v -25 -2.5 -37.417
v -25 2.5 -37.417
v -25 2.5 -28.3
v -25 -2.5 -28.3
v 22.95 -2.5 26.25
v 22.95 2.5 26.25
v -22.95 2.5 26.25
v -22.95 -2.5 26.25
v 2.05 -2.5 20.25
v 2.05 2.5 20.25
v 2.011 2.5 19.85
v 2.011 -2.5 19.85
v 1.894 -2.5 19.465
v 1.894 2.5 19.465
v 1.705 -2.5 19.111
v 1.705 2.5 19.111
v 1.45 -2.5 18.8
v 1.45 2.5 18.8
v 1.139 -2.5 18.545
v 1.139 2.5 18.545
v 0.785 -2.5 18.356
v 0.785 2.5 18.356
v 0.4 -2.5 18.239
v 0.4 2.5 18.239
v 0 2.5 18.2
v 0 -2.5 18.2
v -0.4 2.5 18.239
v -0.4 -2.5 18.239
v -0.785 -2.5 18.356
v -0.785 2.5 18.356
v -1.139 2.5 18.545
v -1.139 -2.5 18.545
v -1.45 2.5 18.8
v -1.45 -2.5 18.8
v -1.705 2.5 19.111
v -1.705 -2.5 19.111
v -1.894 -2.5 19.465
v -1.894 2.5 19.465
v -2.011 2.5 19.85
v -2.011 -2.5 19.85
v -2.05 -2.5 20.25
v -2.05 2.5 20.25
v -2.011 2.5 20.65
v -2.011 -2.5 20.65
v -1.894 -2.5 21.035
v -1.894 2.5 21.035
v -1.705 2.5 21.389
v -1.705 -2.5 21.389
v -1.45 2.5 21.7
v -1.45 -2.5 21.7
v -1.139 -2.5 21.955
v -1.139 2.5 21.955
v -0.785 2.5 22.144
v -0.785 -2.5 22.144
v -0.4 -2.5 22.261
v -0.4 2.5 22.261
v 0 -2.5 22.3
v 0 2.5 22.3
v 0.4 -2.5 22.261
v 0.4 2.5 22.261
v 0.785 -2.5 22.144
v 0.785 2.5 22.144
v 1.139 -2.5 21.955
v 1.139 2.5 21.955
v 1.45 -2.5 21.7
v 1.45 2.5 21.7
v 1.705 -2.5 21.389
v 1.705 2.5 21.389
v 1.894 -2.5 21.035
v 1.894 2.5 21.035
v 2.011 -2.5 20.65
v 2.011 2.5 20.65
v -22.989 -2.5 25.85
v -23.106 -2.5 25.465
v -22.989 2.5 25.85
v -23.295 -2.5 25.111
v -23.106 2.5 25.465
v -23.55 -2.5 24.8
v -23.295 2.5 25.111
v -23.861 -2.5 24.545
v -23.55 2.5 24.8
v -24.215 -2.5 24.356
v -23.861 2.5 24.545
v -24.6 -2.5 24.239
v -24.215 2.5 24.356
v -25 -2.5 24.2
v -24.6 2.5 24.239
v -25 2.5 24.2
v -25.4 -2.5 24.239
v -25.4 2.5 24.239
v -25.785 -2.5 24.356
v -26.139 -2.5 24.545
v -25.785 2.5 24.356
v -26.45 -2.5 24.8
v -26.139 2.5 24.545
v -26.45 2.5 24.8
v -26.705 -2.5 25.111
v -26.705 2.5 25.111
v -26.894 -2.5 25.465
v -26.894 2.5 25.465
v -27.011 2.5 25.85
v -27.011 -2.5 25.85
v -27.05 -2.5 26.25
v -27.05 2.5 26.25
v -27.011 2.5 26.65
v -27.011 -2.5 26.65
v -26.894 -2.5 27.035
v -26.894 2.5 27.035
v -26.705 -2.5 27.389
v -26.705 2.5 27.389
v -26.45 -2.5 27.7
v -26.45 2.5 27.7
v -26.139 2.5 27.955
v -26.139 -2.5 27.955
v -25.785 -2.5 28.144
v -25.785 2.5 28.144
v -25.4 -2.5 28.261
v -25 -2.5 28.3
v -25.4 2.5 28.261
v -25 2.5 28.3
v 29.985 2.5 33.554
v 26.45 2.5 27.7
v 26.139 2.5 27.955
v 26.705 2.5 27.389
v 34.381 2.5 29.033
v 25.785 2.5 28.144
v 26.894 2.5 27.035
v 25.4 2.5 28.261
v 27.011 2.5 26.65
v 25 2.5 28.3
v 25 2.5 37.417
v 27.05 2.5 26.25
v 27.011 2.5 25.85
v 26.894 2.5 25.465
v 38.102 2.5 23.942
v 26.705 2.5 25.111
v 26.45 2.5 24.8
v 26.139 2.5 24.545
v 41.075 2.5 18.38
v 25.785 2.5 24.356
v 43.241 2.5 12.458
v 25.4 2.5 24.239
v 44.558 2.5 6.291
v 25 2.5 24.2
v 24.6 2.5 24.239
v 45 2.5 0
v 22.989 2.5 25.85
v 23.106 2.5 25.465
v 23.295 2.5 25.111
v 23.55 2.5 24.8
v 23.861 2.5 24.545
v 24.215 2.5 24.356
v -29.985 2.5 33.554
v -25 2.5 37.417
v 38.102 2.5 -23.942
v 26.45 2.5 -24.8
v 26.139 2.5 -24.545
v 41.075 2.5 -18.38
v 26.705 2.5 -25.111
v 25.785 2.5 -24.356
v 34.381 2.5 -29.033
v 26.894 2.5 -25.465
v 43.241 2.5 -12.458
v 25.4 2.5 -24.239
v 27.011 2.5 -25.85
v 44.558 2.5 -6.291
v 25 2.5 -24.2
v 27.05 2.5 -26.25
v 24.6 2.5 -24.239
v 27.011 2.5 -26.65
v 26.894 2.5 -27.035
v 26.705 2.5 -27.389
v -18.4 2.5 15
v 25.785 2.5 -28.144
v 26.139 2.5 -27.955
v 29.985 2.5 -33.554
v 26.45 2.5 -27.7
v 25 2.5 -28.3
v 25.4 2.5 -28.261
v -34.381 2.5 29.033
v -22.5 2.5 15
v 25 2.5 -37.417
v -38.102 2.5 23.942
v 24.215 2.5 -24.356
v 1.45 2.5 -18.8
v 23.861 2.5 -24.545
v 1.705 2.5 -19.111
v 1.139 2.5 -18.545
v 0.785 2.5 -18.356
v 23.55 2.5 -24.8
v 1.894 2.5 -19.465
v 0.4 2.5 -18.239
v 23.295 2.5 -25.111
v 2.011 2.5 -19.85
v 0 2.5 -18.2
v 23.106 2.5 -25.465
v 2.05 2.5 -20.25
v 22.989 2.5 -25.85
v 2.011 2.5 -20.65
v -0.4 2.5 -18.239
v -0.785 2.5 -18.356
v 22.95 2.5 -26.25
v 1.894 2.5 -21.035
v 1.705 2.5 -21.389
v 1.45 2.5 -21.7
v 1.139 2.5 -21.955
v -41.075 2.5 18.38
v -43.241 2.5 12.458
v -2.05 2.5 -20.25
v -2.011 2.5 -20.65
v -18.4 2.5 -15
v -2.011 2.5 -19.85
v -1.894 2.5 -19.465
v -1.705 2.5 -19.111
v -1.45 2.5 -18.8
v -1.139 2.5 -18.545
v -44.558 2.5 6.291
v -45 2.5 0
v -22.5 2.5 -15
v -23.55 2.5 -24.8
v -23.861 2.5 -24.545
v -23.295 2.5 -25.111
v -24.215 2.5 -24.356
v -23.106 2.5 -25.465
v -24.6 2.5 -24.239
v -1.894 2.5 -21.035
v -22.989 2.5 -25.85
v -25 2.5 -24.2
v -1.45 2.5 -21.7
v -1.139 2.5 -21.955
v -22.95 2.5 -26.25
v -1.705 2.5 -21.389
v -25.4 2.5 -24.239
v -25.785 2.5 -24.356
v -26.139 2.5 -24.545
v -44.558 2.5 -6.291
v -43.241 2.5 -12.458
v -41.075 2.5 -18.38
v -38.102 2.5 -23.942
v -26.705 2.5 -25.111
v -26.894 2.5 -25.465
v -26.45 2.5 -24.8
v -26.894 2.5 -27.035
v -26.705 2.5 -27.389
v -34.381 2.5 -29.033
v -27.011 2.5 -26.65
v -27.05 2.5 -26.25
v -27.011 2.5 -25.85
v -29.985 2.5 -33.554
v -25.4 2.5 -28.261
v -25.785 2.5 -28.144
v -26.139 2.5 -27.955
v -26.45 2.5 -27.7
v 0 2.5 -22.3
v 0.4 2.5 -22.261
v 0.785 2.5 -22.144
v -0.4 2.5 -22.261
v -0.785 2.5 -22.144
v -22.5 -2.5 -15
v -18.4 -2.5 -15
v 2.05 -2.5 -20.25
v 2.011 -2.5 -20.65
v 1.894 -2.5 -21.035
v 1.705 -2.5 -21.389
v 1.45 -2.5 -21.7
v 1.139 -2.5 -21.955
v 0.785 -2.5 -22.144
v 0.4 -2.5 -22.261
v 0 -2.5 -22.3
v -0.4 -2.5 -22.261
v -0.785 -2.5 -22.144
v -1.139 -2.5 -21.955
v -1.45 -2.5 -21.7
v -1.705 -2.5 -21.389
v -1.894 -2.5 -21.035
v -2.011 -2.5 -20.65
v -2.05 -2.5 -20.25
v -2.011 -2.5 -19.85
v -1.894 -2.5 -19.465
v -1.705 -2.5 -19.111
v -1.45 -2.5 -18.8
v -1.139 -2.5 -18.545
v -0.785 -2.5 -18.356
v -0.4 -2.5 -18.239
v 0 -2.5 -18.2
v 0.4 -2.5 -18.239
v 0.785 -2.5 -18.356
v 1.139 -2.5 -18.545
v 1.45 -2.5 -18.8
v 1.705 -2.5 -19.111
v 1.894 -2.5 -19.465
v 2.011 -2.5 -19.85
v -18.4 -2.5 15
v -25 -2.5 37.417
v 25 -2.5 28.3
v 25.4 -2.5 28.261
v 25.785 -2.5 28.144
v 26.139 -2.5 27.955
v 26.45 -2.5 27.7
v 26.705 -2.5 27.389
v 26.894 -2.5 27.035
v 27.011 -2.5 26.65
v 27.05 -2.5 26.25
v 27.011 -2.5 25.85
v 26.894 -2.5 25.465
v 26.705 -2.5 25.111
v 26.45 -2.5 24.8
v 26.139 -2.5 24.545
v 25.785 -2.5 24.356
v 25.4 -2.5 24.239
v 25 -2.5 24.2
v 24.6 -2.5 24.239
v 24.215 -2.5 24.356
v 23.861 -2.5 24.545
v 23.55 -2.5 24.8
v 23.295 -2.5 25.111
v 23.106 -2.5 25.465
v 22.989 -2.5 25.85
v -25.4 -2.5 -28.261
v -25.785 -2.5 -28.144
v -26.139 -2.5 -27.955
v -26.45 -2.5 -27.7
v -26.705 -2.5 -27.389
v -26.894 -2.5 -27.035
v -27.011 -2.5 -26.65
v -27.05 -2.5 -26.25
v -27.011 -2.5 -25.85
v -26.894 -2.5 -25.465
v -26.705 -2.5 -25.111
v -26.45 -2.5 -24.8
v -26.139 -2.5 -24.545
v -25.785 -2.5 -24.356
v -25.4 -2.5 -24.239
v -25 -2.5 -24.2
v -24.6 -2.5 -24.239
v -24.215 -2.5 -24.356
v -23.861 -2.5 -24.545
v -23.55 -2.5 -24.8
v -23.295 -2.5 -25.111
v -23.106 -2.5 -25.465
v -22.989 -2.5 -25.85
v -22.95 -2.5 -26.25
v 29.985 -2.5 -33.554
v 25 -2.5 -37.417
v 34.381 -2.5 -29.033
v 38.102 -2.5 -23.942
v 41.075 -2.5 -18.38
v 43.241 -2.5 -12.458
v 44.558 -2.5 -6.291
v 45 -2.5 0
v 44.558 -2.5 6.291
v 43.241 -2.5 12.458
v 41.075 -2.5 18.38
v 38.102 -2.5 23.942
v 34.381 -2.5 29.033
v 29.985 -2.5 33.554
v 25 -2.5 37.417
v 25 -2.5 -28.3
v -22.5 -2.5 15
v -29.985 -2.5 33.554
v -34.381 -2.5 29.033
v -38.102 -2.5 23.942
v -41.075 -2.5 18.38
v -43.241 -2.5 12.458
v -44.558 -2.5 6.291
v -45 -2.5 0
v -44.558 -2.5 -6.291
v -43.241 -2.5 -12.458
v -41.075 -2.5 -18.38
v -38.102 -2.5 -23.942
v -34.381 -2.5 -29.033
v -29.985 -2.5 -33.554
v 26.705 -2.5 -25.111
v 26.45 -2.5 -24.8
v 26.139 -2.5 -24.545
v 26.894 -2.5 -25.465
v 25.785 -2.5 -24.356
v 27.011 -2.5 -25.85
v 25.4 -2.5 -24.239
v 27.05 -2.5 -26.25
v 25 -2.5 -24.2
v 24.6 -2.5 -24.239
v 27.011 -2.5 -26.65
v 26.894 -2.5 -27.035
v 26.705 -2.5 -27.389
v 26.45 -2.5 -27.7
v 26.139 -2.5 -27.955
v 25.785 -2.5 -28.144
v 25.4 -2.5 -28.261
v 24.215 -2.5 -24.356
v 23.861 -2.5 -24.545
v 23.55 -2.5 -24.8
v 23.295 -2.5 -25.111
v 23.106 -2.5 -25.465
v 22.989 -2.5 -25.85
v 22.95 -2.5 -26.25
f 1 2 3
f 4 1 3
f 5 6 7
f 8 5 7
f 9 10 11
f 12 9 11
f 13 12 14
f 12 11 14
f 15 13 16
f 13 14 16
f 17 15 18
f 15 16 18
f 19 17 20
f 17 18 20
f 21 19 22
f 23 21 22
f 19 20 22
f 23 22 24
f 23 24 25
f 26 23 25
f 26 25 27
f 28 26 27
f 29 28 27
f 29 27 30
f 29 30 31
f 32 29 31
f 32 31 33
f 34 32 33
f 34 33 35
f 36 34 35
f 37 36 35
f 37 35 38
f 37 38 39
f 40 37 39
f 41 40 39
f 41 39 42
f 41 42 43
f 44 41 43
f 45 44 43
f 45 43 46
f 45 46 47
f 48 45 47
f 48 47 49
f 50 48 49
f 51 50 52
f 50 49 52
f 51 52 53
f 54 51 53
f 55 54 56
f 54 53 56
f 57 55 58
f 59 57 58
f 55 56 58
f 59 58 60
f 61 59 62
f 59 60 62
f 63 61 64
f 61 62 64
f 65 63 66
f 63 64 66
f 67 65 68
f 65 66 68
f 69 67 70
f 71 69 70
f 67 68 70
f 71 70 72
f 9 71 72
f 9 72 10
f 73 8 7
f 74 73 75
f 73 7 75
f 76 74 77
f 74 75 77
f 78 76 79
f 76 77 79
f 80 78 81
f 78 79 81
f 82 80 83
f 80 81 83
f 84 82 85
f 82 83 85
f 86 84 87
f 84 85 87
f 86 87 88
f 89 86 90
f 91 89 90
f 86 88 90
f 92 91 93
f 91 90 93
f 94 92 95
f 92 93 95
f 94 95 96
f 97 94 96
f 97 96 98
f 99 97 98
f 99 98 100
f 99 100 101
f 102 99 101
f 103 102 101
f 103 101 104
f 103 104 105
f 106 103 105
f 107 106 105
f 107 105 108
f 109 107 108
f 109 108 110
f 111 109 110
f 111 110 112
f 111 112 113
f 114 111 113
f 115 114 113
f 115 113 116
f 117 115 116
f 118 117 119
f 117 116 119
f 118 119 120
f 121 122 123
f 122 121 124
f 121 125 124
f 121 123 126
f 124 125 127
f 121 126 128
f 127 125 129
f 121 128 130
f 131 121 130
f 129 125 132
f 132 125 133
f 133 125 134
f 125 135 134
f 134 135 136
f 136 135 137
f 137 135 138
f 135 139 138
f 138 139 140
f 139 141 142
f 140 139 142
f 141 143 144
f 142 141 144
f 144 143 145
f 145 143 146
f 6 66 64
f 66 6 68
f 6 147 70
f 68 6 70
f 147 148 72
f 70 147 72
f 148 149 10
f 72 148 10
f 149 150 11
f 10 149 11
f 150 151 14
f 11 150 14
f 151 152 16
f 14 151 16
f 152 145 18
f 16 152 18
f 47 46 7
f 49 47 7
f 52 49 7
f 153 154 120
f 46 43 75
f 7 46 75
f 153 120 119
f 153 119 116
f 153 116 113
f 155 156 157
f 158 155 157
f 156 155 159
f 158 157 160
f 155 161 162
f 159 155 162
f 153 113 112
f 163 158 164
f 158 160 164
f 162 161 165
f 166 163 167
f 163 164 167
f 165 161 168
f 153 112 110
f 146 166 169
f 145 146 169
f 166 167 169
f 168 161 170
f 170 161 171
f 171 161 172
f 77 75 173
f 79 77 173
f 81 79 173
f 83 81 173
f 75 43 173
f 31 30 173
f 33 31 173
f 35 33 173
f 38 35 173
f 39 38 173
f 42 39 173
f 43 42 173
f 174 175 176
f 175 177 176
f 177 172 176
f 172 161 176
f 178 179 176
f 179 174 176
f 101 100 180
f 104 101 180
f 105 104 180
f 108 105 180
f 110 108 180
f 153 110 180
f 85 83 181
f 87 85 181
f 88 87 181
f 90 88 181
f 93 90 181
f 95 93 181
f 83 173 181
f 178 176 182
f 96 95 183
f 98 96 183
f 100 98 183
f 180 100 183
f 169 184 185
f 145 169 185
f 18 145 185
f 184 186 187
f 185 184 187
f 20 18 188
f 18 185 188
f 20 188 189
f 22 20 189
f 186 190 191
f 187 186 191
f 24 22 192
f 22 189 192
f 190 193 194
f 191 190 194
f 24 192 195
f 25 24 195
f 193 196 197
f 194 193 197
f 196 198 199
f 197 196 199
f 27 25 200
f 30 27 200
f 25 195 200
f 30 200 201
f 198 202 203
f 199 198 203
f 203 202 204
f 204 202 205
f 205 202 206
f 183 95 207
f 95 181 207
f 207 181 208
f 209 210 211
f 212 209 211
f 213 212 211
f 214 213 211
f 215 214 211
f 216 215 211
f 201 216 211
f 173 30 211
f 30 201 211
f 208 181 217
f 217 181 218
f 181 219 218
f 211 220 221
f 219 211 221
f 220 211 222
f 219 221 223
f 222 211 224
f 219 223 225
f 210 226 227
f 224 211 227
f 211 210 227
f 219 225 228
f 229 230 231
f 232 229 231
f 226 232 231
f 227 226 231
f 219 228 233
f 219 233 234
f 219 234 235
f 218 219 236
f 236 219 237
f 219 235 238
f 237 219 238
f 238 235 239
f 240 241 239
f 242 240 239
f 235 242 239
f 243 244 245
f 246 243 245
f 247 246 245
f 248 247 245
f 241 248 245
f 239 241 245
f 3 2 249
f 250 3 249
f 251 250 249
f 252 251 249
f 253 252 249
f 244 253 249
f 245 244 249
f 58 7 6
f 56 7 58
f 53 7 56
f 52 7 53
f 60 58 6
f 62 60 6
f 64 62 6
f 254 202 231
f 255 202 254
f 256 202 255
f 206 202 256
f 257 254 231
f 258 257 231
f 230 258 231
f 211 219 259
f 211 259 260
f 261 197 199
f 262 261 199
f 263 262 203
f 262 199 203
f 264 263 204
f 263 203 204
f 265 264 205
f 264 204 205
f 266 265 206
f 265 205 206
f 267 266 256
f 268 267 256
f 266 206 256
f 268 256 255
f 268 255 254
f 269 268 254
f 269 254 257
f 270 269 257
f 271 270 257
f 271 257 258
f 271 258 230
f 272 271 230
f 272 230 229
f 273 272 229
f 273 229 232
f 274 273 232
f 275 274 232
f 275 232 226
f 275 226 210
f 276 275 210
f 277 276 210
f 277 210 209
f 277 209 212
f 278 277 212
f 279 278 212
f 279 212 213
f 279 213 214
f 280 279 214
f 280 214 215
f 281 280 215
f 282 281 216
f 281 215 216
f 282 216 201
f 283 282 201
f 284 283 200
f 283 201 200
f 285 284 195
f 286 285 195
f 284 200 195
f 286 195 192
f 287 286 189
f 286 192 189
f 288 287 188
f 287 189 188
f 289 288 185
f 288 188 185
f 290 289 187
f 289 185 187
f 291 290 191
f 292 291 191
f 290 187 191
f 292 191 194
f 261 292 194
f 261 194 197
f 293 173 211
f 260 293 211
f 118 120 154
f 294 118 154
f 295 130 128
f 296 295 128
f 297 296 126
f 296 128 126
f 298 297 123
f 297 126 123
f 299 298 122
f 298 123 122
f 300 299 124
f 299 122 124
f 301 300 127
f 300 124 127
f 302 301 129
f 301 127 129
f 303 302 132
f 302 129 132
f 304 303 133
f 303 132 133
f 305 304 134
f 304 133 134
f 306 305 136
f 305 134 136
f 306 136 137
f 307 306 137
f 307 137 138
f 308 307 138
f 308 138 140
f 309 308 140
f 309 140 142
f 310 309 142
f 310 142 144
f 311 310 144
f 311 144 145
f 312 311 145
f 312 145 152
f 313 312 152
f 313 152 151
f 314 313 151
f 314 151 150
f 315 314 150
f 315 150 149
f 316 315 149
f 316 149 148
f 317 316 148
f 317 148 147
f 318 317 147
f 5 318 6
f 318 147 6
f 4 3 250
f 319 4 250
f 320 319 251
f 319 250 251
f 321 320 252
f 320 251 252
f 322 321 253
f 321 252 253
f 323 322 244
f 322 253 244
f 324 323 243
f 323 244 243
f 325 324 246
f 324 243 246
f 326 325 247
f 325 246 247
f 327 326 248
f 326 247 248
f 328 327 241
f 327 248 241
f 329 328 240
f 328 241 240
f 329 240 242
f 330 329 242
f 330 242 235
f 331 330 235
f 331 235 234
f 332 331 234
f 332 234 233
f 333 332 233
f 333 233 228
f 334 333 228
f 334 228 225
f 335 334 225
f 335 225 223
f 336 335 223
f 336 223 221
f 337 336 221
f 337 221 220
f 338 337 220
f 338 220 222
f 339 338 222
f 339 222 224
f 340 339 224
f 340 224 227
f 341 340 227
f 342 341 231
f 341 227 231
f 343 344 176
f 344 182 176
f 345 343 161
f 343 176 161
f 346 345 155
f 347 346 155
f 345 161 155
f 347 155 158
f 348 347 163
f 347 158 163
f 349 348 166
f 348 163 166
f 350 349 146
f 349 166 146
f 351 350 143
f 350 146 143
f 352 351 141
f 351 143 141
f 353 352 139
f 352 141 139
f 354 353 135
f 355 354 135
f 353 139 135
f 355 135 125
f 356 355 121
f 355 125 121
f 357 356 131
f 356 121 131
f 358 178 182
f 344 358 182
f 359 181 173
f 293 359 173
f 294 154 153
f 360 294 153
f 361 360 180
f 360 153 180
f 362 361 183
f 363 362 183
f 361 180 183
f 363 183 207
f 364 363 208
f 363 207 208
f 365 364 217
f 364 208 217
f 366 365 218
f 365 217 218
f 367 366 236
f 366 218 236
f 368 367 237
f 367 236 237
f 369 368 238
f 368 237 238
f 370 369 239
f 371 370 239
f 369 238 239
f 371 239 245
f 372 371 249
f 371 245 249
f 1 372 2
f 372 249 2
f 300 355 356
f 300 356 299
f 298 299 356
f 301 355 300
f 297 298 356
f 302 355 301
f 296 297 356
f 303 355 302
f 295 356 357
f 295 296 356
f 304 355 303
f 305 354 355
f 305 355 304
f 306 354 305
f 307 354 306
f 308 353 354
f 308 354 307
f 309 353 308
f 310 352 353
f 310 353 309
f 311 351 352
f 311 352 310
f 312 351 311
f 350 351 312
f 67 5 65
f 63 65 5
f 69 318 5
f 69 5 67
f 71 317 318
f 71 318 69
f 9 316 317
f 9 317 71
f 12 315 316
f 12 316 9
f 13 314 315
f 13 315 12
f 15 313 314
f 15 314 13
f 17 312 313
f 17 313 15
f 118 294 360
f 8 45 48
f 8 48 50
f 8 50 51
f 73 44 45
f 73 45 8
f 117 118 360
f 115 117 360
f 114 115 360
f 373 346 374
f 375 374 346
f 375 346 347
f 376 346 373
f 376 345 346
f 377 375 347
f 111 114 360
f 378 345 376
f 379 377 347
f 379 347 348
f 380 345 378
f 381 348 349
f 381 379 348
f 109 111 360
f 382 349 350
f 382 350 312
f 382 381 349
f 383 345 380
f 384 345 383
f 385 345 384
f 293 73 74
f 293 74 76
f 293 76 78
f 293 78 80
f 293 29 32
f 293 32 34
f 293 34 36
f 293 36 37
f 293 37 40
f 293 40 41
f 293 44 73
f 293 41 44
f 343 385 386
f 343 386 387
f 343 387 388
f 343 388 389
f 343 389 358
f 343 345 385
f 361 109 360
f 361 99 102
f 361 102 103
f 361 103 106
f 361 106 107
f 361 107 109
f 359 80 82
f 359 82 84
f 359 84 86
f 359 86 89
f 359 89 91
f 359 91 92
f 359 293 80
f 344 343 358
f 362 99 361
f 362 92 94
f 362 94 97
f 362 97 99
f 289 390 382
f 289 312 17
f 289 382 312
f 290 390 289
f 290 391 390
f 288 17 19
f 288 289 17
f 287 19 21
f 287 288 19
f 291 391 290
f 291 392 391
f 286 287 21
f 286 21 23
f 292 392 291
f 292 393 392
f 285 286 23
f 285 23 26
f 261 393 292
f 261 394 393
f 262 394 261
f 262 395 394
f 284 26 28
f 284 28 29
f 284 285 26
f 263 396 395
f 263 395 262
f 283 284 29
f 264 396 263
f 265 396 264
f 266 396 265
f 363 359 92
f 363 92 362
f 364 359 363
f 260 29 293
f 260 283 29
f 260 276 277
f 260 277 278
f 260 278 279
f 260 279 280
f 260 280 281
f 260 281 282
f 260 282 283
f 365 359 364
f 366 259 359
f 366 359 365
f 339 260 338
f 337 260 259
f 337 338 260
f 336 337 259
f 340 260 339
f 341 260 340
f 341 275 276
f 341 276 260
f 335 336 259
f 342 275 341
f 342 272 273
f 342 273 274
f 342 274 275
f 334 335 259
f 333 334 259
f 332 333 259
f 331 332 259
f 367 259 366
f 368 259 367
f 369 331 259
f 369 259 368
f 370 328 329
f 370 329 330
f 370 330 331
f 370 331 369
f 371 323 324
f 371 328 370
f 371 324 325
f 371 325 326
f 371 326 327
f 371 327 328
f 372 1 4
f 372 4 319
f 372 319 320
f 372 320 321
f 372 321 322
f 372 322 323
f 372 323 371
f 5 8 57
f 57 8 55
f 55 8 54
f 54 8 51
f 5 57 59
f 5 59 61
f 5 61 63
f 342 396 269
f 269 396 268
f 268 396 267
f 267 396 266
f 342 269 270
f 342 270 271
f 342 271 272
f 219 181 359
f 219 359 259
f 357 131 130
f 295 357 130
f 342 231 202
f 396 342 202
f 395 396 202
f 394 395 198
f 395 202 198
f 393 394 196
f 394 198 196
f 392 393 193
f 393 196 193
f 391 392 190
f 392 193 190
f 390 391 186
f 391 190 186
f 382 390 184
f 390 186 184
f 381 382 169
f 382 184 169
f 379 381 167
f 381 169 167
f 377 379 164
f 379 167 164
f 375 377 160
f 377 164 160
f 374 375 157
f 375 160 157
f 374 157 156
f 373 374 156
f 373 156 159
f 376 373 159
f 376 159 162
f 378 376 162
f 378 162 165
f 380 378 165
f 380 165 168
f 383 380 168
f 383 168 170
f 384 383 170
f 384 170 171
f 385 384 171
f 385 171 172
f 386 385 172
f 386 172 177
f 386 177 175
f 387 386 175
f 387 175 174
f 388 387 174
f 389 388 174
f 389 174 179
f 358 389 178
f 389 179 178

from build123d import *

# Parameters (mm, degrees)
ESTRUSIONE_ESTRUSIONE1_DEPTH = 2.5
CROQUIS2_R                   = 2.05
CORTAR_EXTRUIR1_DEPTH        = 6
CUT_EXTRUDE1_REACH           = 7
SKETCH1_W                    = 4.1
SKETCH1_H                    = 30
CUT_EXTRUDE2_REACH           = 7
SKETCH2_R                    = 2.05


with BuildPart() as part:
    # Schizzo1 → Estrusione-Estrusione1 (new body, symmetric)
    with BuildSketch(Plane(origin=(0, 0, 0), x_dir=(1, 0, 0), z_dir=(0, 1, 0))):
        with BuildLine():
            Line((-25, 37.416573868), (-25, 26.25))
            Line((-25, 26.25), (25, 26.25))
            Line((25, 26.25), (25, 37.416573868))
            ThreePointArc((25, 37.416573868), (45, 0), (25, -37.416573868))
            Line((25, -37.416573868), (25, -26.25))
            Line((25, -26.25), (-25, -26.25))
            Line((-25, -26.25), (-25, -37.416573868))
            ThreePointArc((-25, -37.416573868), (-45, 0), (-25, 37.416573868))
        make_face()
    extrude(amount=ESTRUSIONE_ESTRUSIONE1_DEPTH, both=True)

    # Croquis2 → Cortar-Extruir1 (cut, through all)
    with BuildSketch(Plane(origin=(0, 2.5, 0), x_dir=(1, 0, 0), z_dir=(0, 1, 0))):
        with Locations((0, 20.25)):
            Circle(CROQUIS2_R)
        with Locations((0, -20.25)):
            Circle(CROQUIS2_R)
    extrude(amount=-CORTAR_EXTRUIR1_DEPTH, mode=Mode.SUBTRACT)

    # Sketch1 → Cut-Extrude1 (cut, up to next)
    with BuildSketch(Plane(origin=(0, 2.5, 0), x_dir=(1, 0, 0), z_dir=(0, 1, 0)), mode=Mode.PRIVATE) as cut_extrude1_sk1:
        with Locations((-20.45, 0)):
            Rectangle(SKETCH1_W, SKETCH1_H)
    cut_extrude1_tool1 = extrude(cut_extrude1_sk1.sketch, amount=-CUT_EXTRUDE1_REACH, mode=Mode.PRIVATE) & part.part
    add(cut_extrude1_tool1.solids().sort_by_distance((-20.45, 2.5, 0))[0], mode=Mode.SUBTRACT)

    # Sketch2 → Cut-Extrude2 (cut, up to next)
    with BuildSketch(Plane(origin=(0, 2.5, 0), x_dir=(1, 0, 0), z_dir=(0, 1, 0)), mode=Mode.PRIVATE) as cut_extrude2_sk1:
        with Locations((-25, 26.25)):
            Circle(SKETCH2_R)
    cut_extrude2_tool1 = extrude(cut_extrude2_sk1.sketch, amount=-CUT_EXTRUDE2_REACH, mode=Mode.PRIVATE) & part.part
    add(cut_extrude2_tool1.solids().sort_by_distance((-25, 2.5, -26.25))[0], mode=Mode.SUBTRACT)
    # Sketch2 → Cut-Extrude2 (cut, up to next)
    with BuildSketch(Plane(origin=(0, 2.5, 0), x_dir=(1, 0, 0), z_dir=(0, 1, 0)), mode=Mode.PRIVATE) as cut_extrude2_sk2:
        with Locations((-25, -26.25)):
            Circle(SKETCH2_R)
    cut_extrude2_tool2 = extrude(cut_extrude2_sk2.sketch, amount=-CUT_EXTRUDE2_REACH, mode=Mode.PRIVATE) & part.part
    add(cut_extrude2_tool2.solids().sort_by_distance((-25, 2.5, 26.25))[0], mode=Mode.SUBTRACT)
    # Sketch2 → Cut-Extrude2 (cut, up to next)
    with BuildSketch(Plane(origin=(0, 2.5, 0), x_dir=(1, 0, 0), z_dir=(0, 1, 0)), mode=Mode.PRIVATE) as cut_extrude2_sk3:
        with Locations((25, -26.25)):
            Circle(SKETCH2_R)
    cut_extrude2_tool3 = extrude(cut_extrude2_sk3.sketch, amount=-CUT_EXTRUDE2_REACH, mode=Mode.PRIVATE) & part.part
    add(cut_extrude2_tool3.solids().sort_by_distance((25, 2.5, 26.25))[0], mode=Mode.SUBTRACT)
    # Sketch2 → Cut-Extrude2 (cut, up to next)
    with BuildSketch(Plane(origin=(0, 2.5, 0), x_dir=(1, 0, 0), z_dir=(0, 1, 0)), mode=Mode.PRIVATE) as cut_extrude2_sk4:
        with Locations((25, 26.25)):
            Circle(SKETCH2_R)
    cut_extrude2_tool4 = extrude(cut_extrude2_sk4.sketch, amount=-CUT_EXTRUDE2_REACH, mode=Mode.PRIVATE) & part.part
    add(cut_extrude2_tool4.solids().sort_by_distance((25, 2.5, -26.25))[0], mode=Mode.SUBTRACT)


solid = part.part
